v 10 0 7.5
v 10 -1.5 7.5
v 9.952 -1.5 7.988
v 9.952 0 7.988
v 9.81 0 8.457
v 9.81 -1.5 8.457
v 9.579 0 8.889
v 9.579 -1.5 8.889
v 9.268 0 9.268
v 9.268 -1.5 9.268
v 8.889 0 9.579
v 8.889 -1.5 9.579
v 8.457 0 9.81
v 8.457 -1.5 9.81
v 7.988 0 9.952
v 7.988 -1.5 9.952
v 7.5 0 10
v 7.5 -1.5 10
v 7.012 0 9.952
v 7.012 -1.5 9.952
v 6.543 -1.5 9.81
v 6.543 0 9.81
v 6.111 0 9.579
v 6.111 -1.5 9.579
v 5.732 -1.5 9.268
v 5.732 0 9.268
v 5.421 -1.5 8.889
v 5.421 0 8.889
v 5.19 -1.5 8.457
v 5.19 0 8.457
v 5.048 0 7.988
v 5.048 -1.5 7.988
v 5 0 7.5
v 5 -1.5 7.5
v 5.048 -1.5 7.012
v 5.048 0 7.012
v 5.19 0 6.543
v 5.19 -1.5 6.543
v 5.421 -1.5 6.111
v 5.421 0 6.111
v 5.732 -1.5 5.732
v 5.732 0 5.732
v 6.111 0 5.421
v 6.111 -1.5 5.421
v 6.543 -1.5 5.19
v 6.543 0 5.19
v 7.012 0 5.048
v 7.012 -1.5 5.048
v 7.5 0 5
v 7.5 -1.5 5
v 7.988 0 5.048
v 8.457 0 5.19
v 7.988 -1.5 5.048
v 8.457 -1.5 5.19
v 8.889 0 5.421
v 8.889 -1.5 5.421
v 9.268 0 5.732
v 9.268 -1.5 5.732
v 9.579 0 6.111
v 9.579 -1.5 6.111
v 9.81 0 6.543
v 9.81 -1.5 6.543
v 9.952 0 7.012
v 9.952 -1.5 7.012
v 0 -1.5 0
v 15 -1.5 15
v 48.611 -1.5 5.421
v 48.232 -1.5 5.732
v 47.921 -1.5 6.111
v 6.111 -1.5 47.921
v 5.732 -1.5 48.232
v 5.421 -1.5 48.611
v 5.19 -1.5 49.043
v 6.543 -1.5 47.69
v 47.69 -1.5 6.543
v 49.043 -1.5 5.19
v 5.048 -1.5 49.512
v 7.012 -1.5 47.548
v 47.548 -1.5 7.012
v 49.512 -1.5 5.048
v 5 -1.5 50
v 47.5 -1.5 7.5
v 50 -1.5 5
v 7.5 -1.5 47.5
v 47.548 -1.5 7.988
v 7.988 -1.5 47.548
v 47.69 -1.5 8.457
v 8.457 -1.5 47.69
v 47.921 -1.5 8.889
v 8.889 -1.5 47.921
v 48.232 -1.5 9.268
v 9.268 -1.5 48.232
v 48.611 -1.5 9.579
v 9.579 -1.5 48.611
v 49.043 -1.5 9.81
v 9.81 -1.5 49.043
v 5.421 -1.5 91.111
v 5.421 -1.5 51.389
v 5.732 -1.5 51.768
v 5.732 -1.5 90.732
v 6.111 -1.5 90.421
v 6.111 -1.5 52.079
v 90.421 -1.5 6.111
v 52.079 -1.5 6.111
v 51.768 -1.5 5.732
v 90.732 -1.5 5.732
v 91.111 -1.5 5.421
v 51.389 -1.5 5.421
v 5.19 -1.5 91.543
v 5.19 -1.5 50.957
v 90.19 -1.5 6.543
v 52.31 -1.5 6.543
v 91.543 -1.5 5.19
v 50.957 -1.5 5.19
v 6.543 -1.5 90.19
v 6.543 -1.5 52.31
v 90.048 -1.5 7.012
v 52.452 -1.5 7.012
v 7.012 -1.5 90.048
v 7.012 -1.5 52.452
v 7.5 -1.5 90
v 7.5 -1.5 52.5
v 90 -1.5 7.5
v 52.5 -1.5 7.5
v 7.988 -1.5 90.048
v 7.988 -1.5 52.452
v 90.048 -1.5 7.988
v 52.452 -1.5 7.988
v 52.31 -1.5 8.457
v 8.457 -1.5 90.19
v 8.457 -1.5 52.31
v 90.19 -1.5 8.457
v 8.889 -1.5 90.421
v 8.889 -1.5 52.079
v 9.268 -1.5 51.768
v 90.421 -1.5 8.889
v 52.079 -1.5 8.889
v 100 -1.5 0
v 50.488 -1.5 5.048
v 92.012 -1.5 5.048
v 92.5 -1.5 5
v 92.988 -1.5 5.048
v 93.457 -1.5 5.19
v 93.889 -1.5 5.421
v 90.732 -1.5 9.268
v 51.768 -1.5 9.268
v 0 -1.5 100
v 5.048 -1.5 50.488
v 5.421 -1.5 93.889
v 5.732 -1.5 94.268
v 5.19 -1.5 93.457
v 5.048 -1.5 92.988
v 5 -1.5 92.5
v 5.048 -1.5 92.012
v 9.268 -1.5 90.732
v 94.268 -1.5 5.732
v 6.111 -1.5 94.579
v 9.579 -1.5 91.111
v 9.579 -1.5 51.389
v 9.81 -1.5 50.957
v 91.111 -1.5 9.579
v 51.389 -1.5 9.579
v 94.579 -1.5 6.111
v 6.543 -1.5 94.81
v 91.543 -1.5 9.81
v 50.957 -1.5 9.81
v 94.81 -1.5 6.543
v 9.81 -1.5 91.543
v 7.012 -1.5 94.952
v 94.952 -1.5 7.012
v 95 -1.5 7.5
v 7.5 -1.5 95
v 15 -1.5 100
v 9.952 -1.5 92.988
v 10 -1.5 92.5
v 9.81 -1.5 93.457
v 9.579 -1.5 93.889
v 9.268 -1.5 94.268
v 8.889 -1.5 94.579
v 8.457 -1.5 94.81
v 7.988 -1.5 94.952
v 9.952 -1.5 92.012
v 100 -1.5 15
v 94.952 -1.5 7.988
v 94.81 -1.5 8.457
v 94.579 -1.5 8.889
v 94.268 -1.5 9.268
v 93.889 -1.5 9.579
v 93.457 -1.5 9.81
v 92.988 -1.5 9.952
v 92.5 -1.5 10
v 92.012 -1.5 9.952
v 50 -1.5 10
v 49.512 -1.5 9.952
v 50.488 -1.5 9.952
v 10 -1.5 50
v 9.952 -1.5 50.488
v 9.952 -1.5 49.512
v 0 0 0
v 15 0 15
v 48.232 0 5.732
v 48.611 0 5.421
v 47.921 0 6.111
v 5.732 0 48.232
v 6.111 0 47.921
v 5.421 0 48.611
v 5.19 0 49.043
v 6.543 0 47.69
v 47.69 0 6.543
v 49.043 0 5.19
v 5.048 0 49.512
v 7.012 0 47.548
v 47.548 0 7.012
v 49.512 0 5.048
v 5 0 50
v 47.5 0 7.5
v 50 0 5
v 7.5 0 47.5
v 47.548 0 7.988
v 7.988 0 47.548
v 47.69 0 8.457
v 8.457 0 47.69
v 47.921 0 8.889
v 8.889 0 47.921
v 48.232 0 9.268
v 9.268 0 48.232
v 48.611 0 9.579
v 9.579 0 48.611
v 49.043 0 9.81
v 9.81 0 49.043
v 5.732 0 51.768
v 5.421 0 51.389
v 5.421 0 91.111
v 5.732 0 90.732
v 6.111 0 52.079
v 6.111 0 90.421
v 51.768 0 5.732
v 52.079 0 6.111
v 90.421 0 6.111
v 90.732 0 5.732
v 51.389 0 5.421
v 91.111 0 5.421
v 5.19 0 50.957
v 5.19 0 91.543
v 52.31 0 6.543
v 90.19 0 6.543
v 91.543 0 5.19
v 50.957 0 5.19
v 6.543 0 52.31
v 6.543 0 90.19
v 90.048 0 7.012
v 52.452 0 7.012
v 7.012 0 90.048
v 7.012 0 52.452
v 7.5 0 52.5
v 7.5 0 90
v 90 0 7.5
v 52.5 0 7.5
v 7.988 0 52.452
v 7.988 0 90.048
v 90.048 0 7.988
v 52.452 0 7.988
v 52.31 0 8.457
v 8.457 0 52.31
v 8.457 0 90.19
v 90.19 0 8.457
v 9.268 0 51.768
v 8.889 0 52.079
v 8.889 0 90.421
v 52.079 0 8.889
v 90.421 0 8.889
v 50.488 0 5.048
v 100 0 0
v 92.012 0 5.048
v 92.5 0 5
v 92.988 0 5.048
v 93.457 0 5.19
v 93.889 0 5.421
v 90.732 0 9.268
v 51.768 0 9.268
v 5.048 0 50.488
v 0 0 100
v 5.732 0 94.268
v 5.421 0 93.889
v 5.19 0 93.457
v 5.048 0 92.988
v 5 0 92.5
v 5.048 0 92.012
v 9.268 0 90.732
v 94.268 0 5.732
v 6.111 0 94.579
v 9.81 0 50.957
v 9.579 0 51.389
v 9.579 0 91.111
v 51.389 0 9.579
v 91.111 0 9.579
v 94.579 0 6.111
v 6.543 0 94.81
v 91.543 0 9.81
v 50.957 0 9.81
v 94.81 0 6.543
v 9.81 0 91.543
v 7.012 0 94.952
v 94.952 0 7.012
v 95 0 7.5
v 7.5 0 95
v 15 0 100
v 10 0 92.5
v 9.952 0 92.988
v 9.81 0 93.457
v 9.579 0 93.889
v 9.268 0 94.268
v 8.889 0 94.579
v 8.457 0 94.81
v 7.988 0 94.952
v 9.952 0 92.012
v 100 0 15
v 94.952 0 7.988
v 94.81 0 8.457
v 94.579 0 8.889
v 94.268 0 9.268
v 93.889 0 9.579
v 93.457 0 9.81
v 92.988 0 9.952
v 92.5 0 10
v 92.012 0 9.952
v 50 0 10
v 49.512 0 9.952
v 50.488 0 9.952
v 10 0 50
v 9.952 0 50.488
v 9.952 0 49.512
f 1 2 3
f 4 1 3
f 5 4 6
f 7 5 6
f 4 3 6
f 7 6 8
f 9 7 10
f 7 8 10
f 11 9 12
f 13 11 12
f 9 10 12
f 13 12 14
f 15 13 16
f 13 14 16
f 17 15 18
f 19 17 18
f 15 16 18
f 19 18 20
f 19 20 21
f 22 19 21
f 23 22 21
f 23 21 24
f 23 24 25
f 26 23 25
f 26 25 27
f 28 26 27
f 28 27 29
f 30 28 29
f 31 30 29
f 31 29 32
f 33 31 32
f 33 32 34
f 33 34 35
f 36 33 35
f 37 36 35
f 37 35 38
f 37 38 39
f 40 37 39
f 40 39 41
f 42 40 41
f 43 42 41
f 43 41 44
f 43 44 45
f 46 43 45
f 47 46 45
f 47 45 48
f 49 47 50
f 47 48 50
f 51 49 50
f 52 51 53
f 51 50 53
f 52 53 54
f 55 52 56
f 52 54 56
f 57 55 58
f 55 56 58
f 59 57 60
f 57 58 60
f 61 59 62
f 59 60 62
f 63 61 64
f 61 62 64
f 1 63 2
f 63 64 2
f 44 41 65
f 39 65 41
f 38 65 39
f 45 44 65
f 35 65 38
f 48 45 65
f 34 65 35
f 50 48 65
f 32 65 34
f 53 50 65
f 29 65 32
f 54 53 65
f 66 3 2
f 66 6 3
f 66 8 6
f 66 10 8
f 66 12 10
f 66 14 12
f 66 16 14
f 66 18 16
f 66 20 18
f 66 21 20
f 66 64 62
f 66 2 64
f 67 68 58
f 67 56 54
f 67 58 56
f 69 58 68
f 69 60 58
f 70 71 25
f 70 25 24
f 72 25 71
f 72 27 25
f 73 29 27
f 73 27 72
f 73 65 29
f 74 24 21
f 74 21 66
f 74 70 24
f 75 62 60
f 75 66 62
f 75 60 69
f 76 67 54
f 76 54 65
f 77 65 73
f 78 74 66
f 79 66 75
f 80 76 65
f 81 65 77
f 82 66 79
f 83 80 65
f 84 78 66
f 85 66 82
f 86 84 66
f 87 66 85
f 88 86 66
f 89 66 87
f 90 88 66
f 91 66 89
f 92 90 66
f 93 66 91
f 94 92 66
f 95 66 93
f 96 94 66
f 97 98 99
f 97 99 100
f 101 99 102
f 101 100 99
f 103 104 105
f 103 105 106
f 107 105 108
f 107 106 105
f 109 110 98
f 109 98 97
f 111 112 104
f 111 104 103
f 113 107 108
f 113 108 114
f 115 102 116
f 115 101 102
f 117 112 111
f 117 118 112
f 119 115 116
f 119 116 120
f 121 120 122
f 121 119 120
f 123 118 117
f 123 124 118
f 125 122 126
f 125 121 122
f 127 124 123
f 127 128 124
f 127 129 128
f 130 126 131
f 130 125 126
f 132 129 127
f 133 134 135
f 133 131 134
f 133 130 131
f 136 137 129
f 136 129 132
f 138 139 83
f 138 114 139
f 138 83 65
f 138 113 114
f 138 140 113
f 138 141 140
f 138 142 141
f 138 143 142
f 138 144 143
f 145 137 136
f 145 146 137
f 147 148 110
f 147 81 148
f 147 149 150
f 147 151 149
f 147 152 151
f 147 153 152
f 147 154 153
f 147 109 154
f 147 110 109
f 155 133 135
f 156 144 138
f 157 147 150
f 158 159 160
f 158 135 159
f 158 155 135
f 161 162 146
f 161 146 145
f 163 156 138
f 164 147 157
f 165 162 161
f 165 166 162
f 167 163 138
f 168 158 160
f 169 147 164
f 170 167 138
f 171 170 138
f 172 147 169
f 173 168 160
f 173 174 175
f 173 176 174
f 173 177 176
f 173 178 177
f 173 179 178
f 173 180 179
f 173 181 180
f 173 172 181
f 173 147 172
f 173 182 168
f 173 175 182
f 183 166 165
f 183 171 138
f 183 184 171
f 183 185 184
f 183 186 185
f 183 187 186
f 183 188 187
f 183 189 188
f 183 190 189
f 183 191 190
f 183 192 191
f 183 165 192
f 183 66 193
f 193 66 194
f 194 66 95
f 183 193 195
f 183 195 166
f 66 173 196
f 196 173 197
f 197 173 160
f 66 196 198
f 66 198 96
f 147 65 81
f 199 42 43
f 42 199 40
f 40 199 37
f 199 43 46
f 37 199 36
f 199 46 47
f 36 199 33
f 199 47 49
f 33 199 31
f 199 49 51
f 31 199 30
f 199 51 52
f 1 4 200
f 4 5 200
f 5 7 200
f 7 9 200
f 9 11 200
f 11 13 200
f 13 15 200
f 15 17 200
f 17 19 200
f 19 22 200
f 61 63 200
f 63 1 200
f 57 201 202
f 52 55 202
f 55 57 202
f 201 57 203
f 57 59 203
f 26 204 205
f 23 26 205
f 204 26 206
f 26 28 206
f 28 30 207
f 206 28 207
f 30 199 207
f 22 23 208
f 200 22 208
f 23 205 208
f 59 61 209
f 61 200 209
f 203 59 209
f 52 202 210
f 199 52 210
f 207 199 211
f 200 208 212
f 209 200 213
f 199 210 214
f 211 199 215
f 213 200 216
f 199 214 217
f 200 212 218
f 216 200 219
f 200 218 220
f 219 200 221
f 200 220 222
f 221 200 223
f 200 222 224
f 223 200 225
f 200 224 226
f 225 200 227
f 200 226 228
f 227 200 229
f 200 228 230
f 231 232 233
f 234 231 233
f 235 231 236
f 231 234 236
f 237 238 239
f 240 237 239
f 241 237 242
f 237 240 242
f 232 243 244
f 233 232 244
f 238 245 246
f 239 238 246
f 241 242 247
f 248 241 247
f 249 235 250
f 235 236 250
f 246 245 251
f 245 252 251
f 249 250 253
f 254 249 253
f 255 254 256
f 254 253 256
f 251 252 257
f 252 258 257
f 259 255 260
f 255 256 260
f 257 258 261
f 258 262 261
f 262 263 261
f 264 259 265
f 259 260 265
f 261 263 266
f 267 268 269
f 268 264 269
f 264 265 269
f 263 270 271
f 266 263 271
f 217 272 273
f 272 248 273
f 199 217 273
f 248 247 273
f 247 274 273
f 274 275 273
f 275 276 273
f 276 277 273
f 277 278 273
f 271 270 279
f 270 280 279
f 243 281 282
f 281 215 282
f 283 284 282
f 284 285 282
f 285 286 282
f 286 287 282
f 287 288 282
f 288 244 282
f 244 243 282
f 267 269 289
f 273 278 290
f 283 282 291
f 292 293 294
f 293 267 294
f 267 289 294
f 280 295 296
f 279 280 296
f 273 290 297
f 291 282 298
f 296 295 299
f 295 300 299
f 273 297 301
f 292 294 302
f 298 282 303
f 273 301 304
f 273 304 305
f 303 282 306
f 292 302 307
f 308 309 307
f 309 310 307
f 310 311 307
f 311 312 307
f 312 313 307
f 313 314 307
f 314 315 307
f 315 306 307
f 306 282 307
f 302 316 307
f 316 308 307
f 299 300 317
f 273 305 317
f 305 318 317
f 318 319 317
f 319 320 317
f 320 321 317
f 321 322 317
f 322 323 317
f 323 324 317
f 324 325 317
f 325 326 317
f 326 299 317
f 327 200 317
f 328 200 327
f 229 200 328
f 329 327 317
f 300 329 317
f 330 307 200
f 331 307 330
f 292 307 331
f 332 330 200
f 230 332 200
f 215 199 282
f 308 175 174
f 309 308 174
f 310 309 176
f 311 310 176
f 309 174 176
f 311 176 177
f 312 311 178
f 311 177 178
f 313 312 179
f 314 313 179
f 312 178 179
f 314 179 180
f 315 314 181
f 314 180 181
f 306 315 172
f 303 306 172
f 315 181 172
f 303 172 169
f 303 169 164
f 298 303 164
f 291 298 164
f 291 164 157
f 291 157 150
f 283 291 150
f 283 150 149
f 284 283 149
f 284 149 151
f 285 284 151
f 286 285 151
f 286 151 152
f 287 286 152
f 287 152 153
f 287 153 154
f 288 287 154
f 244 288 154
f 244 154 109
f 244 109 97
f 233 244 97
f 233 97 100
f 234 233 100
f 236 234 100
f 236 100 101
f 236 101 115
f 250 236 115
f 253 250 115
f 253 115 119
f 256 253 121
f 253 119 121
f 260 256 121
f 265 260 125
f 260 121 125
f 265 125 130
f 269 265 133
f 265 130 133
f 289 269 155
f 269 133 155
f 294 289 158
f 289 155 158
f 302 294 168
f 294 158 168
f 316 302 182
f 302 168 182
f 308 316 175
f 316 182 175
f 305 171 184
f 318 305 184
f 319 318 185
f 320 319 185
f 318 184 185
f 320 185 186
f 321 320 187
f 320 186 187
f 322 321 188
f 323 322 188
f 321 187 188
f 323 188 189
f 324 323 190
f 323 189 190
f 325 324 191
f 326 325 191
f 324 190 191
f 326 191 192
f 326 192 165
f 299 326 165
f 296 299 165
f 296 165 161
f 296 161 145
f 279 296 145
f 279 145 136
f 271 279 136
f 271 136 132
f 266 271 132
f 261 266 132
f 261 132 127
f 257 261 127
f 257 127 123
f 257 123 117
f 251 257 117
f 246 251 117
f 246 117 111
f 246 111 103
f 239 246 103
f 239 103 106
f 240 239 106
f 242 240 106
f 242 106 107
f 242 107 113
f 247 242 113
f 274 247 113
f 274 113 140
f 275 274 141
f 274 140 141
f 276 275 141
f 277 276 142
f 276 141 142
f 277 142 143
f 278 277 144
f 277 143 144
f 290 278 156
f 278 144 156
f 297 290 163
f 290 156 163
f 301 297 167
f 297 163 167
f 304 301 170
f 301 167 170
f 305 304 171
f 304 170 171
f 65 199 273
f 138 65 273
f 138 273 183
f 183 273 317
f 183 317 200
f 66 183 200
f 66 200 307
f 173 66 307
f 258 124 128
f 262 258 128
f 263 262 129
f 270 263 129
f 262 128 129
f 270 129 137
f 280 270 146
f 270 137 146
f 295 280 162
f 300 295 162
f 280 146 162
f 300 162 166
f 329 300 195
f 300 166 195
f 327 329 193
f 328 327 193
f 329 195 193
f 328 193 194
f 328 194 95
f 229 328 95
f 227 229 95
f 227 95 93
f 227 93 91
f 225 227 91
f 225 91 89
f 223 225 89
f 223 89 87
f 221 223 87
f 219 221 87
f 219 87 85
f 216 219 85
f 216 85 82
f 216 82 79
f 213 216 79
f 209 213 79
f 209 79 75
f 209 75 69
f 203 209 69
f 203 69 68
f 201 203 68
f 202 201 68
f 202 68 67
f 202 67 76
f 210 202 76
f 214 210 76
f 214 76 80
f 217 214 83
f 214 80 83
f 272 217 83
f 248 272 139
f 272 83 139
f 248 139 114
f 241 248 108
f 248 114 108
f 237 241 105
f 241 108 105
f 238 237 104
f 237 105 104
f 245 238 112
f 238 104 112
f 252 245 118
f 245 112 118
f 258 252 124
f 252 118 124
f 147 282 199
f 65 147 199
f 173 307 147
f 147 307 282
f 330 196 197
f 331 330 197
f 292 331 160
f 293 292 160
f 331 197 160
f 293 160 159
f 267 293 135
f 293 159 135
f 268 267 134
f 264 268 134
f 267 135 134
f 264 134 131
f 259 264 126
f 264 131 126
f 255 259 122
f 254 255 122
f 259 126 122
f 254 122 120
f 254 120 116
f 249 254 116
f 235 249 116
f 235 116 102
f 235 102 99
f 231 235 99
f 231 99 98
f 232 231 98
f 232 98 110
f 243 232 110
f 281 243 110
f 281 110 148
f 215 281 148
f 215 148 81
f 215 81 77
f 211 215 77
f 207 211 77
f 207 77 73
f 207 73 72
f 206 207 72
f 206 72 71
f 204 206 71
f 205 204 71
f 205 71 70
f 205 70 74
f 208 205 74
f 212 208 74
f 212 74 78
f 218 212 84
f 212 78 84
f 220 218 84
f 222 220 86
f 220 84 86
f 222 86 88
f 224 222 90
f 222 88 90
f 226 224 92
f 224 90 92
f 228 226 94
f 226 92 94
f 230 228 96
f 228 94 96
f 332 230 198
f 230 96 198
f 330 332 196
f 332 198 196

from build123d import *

# Parameters (mm, degrees)
PAD_DEPTH              = 1.5
SKETCH001_R            = 2.5
POCKET_DEPTH           = 1.501
LINEARPATTERN_COUNT    = 3
LINEARPATTERN_PITCH    = 42.5
LINEARPATTERN001_COUNT = 3
LINEARPATTERN001_PITCH = 42.5


with BuildPart() as part:
    # Sketch → Pad (new body)
    with BuildSketch(Plane.XZ):
        Polygon((0, 0), (100, 0), (100, 15), (15, 15), (15, 100), (0, 100), align=None)
    extrude(amount=PAD_DEPTH)

    # Sketch001 (on Face8 of Pad) → Pocket (cut, through all)
    with BuildSketch(Plane.XZ.offset(1.5)):
        with Locations((7.5, 7.5)):
            Circle(SKETCH001_R)
    pocket = extrude(amount=-POCKET_DEPTH, mode=Mode.SUBTRACT)

    # LinearPattern: Pocket ×3
    with Locations(*[(i * LINEARPATTERN_PITCH, 0, 0) for i in range(1, LINEARPATTERN_COUNT)]):
        add(pocket, mode=Mode.SUBTRACT)

    # LinearPattern001: Pocket ×3
    with Locations(*[(0, 0, i * LINEARPATTERN001_PITCH) for i in range(1, LINEARPATTERN001_COUNT)]):
        add(pocket, mode=Mode.SUBTRACT)


solid = part.part
